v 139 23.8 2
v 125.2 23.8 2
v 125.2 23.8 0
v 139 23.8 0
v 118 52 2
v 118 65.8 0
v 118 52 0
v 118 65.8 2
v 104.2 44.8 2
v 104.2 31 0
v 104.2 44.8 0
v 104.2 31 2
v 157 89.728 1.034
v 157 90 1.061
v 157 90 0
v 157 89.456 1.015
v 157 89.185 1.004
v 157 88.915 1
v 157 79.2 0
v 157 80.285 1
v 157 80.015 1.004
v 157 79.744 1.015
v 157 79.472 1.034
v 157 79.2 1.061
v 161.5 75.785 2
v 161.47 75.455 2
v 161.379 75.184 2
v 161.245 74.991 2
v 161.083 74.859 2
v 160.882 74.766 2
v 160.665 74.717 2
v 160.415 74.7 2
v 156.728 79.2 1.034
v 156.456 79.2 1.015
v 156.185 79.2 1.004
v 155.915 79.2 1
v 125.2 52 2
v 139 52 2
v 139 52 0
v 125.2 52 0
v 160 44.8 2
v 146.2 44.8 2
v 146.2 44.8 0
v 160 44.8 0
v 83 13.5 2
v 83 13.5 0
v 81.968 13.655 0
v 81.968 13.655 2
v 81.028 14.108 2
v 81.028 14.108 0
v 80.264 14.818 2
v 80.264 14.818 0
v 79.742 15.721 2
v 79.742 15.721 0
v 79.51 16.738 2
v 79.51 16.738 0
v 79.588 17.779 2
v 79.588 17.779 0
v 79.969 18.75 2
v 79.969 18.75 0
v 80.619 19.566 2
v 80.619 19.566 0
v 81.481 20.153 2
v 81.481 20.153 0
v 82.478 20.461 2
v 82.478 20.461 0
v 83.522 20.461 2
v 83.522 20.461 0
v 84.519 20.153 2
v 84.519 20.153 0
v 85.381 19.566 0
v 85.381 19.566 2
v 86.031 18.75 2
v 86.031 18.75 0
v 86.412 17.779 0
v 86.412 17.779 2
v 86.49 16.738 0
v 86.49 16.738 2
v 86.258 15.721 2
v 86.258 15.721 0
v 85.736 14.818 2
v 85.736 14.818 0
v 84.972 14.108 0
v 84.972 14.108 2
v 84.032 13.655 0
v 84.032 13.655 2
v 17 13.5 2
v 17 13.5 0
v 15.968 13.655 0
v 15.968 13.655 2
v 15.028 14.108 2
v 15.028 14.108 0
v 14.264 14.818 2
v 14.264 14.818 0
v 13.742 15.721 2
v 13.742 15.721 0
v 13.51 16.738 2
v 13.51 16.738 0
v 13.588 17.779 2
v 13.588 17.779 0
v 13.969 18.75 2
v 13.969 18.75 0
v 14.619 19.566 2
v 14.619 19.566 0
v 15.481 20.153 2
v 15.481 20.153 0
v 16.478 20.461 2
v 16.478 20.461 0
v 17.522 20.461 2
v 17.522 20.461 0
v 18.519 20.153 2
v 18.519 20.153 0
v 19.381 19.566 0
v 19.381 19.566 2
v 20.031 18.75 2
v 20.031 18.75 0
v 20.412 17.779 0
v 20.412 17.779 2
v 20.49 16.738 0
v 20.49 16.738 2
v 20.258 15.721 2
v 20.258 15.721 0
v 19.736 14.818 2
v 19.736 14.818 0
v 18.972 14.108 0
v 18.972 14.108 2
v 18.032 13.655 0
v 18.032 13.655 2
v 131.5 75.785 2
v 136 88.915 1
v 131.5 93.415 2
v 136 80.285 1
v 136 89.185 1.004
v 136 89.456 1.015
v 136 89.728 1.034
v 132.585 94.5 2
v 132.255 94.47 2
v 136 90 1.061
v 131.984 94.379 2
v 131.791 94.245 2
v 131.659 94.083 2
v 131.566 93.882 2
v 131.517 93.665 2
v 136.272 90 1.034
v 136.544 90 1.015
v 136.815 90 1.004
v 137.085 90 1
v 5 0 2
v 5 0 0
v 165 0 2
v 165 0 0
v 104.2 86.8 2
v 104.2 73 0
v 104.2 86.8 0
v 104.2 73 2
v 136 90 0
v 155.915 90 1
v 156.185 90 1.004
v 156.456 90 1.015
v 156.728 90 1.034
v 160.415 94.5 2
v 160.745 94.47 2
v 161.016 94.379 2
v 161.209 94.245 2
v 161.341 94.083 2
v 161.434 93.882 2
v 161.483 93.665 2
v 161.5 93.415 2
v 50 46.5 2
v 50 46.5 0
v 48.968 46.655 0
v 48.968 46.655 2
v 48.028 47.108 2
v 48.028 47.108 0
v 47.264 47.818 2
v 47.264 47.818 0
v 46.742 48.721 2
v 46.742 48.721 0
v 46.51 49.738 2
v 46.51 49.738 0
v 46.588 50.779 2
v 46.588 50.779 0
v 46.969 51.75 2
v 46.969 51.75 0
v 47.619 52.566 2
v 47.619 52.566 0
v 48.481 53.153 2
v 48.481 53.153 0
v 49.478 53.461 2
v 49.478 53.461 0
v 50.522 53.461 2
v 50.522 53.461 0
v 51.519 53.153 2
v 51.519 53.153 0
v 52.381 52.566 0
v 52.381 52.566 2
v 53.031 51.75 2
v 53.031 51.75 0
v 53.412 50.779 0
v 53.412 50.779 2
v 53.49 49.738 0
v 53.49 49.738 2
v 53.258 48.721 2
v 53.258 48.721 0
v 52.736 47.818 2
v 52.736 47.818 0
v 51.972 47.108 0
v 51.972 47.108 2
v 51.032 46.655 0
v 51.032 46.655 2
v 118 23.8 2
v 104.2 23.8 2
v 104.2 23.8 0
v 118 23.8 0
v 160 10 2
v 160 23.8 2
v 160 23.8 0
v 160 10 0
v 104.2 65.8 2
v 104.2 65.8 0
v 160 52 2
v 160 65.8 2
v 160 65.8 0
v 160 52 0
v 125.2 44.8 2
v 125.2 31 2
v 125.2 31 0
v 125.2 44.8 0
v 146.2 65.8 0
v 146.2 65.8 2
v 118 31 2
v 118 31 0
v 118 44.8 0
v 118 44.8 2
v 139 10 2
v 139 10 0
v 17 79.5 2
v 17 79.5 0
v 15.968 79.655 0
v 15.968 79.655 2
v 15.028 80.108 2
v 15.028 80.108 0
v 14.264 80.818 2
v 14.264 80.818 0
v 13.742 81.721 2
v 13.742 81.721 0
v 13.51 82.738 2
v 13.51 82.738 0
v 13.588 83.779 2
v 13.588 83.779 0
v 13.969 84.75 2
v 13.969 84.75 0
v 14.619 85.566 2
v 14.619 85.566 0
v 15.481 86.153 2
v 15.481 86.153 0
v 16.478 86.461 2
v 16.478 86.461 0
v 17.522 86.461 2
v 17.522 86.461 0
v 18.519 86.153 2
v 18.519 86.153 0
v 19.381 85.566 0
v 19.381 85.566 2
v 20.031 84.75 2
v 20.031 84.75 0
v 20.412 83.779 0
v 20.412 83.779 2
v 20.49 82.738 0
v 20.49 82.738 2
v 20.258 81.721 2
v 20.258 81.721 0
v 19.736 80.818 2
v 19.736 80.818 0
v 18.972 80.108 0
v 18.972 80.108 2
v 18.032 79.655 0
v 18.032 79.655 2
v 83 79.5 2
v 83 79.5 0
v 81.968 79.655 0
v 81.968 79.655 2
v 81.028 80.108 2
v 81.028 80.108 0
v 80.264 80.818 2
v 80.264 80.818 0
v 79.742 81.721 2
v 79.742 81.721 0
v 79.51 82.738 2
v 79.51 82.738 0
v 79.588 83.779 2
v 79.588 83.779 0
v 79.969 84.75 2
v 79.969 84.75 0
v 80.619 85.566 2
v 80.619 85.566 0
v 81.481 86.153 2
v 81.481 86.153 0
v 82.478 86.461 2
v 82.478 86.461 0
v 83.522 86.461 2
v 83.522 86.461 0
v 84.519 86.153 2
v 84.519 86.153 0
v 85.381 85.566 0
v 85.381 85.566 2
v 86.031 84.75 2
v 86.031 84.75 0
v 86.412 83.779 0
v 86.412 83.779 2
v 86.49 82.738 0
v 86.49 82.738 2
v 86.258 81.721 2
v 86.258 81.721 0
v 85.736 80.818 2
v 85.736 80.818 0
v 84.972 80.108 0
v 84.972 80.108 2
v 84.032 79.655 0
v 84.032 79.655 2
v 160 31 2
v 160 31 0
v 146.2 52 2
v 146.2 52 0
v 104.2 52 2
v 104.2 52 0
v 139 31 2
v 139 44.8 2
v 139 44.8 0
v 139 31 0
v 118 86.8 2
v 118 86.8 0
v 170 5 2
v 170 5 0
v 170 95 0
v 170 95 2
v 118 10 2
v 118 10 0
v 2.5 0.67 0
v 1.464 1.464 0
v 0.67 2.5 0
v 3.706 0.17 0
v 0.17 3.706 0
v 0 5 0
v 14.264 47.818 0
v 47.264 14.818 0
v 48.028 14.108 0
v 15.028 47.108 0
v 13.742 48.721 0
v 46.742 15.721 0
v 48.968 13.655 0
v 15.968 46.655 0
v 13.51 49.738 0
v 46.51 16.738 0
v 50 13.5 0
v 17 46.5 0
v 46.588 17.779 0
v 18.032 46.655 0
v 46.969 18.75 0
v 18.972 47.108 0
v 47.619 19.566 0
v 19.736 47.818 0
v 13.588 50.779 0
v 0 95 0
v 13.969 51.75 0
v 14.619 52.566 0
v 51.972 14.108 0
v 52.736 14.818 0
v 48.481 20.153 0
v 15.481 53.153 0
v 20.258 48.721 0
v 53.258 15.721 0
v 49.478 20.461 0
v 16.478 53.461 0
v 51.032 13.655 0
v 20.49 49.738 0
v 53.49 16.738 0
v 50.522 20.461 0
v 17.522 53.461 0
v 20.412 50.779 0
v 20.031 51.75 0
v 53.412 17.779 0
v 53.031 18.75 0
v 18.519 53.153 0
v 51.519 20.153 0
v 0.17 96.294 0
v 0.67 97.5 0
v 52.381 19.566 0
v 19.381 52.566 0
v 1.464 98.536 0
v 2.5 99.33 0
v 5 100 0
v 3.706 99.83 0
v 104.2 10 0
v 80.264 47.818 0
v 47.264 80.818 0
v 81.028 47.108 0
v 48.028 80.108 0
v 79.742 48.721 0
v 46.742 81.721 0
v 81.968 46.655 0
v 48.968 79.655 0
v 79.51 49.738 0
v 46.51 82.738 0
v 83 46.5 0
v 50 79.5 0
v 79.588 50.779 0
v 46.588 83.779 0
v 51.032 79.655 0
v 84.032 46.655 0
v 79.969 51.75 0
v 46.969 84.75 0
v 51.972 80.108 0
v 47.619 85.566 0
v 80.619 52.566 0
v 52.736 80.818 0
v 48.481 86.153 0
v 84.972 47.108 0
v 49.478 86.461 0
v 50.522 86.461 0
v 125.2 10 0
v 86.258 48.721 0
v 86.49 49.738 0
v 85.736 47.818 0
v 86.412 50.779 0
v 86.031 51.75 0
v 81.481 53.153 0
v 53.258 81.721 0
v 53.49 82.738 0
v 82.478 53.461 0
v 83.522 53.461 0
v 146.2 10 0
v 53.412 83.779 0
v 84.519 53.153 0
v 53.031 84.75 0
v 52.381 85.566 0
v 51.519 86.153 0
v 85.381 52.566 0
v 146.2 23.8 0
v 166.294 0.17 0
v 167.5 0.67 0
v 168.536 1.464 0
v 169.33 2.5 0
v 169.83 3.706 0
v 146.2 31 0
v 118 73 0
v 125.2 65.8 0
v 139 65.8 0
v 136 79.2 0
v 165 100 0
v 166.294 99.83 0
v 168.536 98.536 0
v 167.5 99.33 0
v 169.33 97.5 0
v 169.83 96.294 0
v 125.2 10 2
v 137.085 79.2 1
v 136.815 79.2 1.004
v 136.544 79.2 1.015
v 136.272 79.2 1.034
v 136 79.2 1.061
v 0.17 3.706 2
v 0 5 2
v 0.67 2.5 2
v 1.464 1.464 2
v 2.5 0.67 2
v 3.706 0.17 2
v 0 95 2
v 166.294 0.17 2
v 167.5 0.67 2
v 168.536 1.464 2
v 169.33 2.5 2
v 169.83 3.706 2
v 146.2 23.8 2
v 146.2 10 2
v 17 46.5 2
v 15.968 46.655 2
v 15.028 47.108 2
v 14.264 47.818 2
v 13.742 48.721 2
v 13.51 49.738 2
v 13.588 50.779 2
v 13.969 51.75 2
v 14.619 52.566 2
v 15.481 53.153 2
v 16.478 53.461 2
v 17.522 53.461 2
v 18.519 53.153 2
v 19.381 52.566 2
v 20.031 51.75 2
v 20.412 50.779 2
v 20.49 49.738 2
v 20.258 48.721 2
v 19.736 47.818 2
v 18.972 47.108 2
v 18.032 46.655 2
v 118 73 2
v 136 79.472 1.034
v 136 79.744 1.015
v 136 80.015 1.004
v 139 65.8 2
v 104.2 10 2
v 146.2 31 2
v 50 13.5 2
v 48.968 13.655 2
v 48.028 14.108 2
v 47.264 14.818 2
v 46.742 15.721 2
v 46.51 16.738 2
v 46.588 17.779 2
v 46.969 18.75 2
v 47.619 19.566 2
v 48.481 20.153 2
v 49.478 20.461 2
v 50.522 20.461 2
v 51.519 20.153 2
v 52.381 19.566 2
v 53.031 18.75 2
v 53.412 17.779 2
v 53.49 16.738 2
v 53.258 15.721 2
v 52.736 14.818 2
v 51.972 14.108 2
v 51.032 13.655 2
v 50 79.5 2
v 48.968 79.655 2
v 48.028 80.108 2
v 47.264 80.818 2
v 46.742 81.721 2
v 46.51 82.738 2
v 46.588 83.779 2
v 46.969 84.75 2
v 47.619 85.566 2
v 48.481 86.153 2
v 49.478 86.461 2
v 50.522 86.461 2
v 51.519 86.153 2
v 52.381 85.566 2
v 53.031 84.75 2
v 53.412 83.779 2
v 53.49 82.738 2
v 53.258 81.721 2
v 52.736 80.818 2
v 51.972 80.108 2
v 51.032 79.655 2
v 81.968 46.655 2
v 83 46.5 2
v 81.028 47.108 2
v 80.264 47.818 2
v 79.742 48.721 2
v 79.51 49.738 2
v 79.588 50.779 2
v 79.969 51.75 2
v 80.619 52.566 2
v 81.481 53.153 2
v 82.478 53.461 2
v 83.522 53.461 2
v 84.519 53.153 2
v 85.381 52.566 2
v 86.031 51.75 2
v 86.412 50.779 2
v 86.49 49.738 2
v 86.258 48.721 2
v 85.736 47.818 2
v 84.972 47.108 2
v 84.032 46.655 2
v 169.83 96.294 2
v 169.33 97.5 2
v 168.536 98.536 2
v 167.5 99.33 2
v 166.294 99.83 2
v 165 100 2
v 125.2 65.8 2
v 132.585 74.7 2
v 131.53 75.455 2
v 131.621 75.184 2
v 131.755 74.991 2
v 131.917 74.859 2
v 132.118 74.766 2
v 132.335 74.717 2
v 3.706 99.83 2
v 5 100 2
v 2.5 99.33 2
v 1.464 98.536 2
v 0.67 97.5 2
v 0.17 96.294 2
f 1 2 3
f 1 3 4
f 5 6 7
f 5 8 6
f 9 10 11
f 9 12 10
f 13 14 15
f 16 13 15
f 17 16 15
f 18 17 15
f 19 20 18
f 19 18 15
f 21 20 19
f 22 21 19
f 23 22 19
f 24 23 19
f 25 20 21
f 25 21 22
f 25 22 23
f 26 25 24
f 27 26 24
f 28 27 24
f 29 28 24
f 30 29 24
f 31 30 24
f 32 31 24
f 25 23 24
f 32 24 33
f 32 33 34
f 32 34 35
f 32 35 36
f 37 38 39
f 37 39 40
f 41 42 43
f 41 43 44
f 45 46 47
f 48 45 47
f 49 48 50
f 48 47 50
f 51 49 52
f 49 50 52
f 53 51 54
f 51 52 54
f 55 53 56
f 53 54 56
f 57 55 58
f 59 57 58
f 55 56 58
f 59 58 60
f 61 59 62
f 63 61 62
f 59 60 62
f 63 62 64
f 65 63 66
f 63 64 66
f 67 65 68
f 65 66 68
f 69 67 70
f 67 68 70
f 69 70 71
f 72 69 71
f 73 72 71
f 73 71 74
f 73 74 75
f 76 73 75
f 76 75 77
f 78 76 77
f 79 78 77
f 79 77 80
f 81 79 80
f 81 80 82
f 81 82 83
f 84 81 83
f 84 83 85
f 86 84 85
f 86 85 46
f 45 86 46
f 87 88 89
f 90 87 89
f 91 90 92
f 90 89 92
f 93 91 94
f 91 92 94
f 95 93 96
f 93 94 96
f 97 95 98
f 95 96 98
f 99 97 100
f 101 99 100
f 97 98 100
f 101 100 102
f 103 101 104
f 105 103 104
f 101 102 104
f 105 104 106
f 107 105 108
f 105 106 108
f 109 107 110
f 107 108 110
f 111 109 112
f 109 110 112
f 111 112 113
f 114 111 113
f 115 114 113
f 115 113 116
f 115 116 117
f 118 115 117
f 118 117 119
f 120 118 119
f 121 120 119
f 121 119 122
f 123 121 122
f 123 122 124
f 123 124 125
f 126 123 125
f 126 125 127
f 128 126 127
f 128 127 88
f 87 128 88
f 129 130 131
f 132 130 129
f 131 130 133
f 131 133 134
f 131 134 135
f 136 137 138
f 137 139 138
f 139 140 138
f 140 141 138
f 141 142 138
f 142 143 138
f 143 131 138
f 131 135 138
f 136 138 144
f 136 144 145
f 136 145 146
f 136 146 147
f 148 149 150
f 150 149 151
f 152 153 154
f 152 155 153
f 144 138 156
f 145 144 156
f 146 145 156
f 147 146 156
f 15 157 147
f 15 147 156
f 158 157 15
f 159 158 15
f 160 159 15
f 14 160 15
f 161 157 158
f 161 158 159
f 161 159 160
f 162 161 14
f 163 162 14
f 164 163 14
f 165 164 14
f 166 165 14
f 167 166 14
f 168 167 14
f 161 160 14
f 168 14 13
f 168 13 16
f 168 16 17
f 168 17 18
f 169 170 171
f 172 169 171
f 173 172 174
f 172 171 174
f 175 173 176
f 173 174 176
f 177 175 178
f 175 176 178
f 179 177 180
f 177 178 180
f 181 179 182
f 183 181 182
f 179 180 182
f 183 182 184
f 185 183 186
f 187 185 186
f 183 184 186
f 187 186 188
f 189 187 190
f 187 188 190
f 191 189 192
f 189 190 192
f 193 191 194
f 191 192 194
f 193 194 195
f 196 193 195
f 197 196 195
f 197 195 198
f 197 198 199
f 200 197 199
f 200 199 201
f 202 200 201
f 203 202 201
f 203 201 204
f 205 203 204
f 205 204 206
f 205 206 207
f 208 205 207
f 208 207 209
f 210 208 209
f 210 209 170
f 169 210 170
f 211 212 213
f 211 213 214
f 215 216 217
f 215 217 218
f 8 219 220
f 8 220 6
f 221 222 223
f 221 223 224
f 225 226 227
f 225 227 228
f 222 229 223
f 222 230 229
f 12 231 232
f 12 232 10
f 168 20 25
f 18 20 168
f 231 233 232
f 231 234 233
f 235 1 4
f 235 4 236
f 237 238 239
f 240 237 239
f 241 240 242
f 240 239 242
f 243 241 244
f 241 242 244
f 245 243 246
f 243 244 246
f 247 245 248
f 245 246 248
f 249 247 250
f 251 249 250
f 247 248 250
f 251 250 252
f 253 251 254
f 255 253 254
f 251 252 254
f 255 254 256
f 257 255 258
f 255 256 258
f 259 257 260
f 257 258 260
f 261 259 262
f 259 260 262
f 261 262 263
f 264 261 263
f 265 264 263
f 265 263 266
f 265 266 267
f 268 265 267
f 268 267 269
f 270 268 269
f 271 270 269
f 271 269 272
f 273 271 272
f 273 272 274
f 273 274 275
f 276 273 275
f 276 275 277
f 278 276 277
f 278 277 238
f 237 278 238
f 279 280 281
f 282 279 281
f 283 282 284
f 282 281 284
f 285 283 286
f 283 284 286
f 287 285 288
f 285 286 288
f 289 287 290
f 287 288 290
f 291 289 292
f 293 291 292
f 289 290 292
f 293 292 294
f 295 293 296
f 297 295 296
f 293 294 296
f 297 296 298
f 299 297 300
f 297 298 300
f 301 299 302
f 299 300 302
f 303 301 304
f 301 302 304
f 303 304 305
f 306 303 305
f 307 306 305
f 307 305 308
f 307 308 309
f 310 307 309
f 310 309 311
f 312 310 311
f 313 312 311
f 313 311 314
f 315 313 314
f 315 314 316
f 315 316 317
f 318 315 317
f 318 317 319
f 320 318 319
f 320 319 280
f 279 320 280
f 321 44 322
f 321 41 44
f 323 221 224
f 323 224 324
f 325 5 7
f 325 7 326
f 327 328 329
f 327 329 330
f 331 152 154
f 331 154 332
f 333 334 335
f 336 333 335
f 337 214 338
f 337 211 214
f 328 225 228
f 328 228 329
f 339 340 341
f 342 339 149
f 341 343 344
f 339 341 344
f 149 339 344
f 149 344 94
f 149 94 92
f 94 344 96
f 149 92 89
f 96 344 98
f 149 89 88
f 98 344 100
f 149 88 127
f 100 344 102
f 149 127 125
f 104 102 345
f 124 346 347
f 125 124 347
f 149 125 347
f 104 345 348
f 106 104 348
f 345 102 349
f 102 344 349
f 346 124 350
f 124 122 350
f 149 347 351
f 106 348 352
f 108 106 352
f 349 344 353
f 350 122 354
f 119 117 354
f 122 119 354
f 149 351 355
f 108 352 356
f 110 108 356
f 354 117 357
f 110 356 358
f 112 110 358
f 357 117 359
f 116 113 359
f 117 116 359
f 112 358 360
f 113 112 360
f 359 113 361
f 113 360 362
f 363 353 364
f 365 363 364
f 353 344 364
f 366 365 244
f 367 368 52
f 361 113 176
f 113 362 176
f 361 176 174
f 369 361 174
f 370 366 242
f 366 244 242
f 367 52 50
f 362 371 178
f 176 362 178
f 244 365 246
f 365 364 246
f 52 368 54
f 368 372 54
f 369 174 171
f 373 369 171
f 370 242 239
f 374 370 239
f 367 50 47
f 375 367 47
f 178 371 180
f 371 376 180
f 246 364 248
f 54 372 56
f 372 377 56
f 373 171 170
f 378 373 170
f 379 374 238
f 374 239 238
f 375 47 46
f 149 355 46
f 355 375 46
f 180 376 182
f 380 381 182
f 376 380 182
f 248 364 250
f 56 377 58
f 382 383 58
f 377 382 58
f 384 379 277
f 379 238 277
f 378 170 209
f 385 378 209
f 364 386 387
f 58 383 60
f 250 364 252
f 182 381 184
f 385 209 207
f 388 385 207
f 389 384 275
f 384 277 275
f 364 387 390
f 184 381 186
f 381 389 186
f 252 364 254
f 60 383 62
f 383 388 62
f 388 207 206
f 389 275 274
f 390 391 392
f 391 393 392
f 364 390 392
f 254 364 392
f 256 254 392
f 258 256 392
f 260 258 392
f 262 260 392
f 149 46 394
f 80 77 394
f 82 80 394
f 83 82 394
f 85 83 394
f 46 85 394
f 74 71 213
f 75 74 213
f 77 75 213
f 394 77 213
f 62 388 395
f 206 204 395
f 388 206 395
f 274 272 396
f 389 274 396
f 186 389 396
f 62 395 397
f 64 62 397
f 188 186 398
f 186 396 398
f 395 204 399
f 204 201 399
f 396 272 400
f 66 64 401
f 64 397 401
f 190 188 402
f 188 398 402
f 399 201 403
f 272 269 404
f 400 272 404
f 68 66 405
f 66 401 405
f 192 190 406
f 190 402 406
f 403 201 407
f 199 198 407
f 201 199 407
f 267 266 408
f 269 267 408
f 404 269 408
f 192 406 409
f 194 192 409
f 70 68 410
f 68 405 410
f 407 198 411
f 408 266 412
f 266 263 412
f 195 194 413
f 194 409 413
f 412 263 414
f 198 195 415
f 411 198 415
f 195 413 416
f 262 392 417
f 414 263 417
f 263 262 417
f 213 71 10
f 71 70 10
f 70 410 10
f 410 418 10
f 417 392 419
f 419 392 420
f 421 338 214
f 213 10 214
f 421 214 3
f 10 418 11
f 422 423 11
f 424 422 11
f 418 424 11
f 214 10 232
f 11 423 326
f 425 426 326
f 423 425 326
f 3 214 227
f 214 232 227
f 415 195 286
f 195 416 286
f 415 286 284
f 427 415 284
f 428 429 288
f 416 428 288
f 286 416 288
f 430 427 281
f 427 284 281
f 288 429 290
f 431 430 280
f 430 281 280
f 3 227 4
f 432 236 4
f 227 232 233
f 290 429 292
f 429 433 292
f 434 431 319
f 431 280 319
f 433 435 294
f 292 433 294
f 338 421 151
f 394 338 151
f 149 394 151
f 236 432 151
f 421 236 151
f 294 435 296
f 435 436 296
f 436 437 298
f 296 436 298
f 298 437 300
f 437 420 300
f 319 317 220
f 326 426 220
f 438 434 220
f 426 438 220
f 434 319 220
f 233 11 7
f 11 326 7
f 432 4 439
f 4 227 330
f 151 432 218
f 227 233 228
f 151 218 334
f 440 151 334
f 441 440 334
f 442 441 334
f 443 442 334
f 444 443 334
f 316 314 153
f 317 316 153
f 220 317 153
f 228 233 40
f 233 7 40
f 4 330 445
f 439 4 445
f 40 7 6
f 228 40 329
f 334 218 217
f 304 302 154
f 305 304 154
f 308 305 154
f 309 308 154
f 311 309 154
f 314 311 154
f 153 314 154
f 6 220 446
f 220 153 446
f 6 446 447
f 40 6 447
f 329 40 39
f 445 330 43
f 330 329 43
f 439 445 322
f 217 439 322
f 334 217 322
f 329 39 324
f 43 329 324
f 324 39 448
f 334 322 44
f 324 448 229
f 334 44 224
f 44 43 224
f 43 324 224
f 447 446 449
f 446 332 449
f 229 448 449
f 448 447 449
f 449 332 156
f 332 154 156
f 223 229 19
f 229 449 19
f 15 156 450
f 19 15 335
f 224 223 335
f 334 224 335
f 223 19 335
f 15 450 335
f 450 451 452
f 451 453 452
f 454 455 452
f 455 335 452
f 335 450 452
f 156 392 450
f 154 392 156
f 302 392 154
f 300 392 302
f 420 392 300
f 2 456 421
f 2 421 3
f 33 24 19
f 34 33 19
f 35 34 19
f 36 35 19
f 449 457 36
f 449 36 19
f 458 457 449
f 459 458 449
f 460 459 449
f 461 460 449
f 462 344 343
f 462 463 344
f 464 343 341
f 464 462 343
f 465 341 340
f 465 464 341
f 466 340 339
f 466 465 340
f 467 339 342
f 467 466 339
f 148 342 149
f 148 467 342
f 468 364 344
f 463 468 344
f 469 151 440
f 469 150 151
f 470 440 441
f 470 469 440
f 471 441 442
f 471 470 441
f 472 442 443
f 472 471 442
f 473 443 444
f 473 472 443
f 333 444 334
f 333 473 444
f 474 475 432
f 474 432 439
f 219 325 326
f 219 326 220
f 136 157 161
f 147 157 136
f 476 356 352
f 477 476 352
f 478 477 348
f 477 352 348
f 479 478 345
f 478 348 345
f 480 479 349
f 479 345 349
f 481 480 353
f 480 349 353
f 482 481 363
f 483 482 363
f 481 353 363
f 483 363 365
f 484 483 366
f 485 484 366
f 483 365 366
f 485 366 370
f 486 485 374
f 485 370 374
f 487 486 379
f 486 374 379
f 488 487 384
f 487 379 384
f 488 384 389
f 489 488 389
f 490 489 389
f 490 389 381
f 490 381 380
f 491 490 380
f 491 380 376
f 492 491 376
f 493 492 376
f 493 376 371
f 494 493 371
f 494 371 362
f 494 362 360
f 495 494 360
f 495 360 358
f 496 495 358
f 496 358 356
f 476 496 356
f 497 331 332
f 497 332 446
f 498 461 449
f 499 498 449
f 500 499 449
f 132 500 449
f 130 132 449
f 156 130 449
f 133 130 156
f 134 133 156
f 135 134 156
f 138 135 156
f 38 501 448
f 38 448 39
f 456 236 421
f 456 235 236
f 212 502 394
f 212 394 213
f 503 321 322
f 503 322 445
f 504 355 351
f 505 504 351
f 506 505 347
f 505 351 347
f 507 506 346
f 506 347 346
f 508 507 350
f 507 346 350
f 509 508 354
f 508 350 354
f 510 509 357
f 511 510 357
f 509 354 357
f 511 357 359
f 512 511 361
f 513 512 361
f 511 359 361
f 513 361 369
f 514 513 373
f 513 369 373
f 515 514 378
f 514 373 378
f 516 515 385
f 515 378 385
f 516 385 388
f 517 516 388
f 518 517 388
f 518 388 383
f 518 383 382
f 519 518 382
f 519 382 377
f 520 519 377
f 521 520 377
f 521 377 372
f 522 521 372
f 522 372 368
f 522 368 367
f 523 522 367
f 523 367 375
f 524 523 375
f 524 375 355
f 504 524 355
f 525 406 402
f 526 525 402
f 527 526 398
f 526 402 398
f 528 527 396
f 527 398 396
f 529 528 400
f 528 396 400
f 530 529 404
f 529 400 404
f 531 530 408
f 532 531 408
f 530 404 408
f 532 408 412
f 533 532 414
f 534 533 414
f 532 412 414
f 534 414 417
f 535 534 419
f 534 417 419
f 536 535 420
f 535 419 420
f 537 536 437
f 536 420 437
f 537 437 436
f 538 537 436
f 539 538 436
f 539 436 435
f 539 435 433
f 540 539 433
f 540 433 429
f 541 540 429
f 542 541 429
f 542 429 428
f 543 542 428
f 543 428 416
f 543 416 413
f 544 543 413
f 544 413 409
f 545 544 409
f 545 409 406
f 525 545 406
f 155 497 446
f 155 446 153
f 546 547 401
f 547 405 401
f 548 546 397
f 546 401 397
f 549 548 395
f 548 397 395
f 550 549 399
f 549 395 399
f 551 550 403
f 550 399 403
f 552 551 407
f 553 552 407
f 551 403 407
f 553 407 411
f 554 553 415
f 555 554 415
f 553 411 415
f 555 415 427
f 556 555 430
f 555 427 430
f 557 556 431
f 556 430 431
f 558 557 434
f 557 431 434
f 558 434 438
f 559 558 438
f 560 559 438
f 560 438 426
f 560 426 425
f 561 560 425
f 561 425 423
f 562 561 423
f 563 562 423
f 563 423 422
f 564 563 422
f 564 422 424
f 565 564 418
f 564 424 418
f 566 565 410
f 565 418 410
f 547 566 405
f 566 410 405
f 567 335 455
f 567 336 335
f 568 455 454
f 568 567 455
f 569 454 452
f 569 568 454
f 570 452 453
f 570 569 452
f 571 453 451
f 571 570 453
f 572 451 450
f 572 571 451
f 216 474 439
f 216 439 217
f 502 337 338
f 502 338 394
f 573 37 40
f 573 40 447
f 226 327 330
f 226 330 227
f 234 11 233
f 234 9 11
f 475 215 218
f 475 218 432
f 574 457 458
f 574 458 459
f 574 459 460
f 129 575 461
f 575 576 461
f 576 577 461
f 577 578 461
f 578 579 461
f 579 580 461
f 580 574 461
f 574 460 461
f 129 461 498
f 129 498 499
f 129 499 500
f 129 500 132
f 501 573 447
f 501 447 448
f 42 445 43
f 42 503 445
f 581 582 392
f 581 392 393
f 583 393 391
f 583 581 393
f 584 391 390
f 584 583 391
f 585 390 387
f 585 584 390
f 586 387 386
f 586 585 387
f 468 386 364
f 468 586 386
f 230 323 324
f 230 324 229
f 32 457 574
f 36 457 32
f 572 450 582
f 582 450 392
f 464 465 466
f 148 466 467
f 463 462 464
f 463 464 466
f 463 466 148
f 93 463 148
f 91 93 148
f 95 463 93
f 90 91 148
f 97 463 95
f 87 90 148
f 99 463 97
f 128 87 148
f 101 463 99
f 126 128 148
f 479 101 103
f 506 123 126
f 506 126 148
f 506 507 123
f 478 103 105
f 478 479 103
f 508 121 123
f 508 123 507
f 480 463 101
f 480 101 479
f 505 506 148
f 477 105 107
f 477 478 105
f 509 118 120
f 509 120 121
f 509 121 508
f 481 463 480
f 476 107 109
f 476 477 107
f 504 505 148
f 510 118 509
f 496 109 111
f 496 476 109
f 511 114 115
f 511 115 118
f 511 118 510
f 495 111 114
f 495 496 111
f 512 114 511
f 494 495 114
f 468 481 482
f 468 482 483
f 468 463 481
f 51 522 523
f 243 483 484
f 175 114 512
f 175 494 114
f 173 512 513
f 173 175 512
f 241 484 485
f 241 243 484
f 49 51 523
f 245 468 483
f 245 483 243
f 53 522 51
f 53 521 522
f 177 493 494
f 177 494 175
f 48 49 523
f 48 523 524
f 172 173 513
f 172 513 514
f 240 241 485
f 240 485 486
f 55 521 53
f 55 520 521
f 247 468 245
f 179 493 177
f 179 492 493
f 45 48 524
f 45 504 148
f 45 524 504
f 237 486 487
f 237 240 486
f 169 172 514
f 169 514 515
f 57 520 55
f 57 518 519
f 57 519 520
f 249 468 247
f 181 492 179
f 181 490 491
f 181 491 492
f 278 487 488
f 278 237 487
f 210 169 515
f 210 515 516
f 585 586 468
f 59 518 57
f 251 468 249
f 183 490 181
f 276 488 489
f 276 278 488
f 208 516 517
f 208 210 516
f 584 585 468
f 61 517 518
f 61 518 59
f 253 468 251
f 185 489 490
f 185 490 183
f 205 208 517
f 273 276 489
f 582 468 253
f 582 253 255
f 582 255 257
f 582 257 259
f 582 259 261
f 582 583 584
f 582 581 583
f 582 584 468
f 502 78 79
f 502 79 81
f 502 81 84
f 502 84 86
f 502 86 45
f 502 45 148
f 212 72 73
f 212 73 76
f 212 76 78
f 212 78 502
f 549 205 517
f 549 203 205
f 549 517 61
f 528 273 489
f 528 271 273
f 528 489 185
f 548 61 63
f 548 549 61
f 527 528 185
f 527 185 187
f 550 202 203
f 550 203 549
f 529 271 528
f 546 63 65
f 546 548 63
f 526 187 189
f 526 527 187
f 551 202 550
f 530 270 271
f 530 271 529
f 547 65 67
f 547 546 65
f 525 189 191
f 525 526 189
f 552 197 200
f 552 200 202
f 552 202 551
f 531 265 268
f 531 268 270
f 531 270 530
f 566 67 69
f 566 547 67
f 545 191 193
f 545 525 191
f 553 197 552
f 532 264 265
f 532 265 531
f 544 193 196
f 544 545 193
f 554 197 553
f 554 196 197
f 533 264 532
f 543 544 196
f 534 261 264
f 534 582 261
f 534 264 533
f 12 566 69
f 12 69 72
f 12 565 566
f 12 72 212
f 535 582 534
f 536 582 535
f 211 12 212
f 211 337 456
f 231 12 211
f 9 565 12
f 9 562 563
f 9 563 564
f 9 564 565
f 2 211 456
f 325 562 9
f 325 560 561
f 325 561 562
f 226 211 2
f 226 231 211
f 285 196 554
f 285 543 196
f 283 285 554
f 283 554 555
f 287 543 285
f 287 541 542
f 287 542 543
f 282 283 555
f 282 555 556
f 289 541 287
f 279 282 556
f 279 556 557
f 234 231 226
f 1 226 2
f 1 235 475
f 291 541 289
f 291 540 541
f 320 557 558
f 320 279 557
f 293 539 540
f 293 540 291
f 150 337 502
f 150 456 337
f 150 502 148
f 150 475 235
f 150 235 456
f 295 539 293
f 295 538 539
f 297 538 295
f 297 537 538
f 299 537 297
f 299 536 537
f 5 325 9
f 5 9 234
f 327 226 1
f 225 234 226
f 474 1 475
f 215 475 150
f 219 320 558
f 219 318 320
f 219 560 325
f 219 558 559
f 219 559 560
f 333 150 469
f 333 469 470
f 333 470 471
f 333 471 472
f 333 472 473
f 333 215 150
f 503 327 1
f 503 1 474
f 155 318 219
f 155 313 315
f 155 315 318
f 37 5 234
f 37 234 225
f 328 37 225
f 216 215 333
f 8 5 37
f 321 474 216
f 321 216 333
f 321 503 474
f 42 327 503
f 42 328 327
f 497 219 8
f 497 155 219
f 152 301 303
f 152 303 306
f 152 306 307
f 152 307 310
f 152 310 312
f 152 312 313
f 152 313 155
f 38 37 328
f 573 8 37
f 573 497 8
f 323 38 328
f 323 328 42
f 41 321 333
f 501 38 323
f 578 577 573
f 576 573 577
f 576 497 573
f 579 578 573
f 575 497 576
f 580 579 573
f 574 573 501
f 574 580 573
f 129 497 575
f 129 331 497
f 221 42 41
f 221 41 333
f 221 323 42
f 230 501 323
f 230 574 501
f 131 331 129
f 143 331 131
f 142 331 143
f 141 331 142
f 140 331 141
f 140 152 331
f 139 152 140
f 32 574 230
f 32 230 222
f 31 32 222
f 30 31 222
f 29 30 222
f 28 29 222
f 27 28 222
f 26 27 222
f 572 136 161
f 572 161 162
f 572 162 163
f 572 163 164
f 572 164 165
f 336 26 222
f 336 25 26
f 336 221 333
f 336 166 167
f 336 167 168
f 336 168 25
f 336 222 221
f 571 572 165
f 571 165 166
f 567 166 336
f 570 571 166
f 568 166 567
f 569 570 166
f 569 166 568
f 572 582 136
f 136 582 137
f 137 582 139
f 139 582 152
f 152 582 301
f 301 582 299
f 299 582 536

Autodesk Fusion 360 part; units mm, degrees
sketch "Sketch1" plane through (0, 0, 0) normal (0, 0, 1) x (1, 0, 0)
  line L0 (0, 0) -> (170, 0)
  line L1 (170, 0) -> (170, 100)
  line L2 (170, 100) -> (0, 100)
  line L3 (0, 100) -> (0, 0)
  dimension "d1" = 170
  dimension "d2" = 100
extrude "Extrude1" add sketch "Sketch1" along normal blind 2 makes body 1
sketch "Sketch2" plane through (0, 0, 2) normal (0, 0, 1) x (-1, 0, 0)
  line L0 (0, -100) -> (0, 0)
  line L1 (0, 0) -> (-170, 0)
  line L2 (-170, 0) -> (-170, -100)
  line L3 (-170, -100) -> (0, -100)
  circle A0 centre (-17, -83) radius 3.5
  circle A1 centre (-50, -83) radius 3.5
  circle A2 centre (-83, -83) radius 3.5
  circle A3 centre (-17, -50) radius 3.5
  circle A4 centre (-50, -50) radius 3.5
  circle A5 centre (-83, -50) radius 3.5
  circle A6 centre (-17, -17) radius 3.5
  circle A7 centre (-50, -17) radius 3.5
  circle A8 centre (-83, -17) radius 3.5
  line L4 (-146.2, -23.8) -> (-160, -23.8)
  line L5 (-160, -23.8) -> (-160, -10)
  line L6 (-160, -10) -> (-146.2, -10)
  line L7 (-146.2, -10) -> (-146.2, -23.8)
  dimension "d5" = 7
  dimension "d9" = -66
  dimension "d10" = 66
  dimension "d11" = 100
  dimension "d12" = 33
  dimension "d13" = 17
  dimension "d14" = 17
  dimension "d15" = 17
  dimension "d16" = 13.8
  dimension "d17" = 13.8
  dimension "d18" = 10
  dimension "d19" = 10
sketch "Sketch3" plane through (0, 0, 2) normal (0, 0, 1) x (-1, 0, 0)
hole "Hole1" at (17, 83, 2) at (50, 83, 2) at (83, 83, 2) at (83, 50, 2) at (83, 17, 2) at (50, 17, 2) at (17, 17, 2) at (17, 50, 2) at (50, 50, 2) direction (0, 0, -1) diameter 7 depth 2 tip angle 180 bodies 1
sketch "Sketch4" plane through (0, 0, 2) normal (0, 0, 1) x (-1, 0, 0)
  line L0 (0, -100) -> (0, 0)
  line L1 (0, 0) -> (-170, 0)
  line L2 (-170, 0) -> (-170, -100)
  line L3 (-170, -100) -> (0, -100)
  circle A0 centre (-50, -50) radius 3.5
  circle A1 centre (-17, -17) radius 3.5
  circle A2 centre (-83, -17) radius 3.5
  circle A3 centre (-83, -83) radius 3.5
  circle A4 centre (-17, -83) radius 3.5
  circle A5 centre (-50, -83) radius 3.5
  circle A6 centre (-83, -50) radius 3.5
  circle A7 centre (-50, -17) radius 3.5
  circle A8 centre (-17, -50) radius 3.5
  line L4 (-160, -10) -> (-146.2, -10)
  line L5 (-146.2, -10) -> (-146.2, -23.8)
  line L6 (-146.2, -23.8) -> (-160, -23.8)
  line L7 (-160, -23.8) -> (-160, -10)
  dimension "d23" = 13.8
  dimension "d24" = 13.8
  dimension "d25" = 10
  dimension "d26" = 10
sketch "Sketch5" plane through (0, 0, 2) normal (0, 0, 1) x (-1, 0, 0)
extrude "Extrude2" cut sketch "Sketch4" against normal blind 2 contours L4 L5 L6 L7 bodies 1
pattern_linear "R-Pattern1" count 3 spacing 21 along (-1, 0, 0) count 3 spacing 21 along (0, 1, 0) of "Extrude2"
sketch "Sketch6" plane through (0, 0, 2) normal (0, 0, 1) x (-1, 0, 0)
  line L0 (-146.2, -10) -> (-146.2, -23.8)
  line L1 (-146.2, -23.8) -> (-160, -23.8)
  line L2 (-160, -23.8) -> (-160, -10)
  line L3 (-160, -10) -> (-146.2, -10)
  line L4 (0, -100) -> (0, 0)
  line L5 (0, 0) -> (-170, 0)
  line L6 (-170, 0) -> (-170, -100)
  line L7 (-170, -100) -> (0, -100)
  circle A0 centre (-50, -50) radius 3.5
  circle A1 centre (-17, -17) radius 3.5
  circle A2 centre (-83, -17) radius 3.5
  circle A3 centre (-83, -83) radius 3.5
  circle A4 centre (-17, -83) radius 3.5
  circle A5 centre (-50, -83) radius 3.5
  circle A6 centre (-83, -50) radius 3.5
  circle A7 centre (-50, -17) radius 3.5
  circle A8 centre (-17, -50) radius 3.5
  line L8 (-125.2, -10) -> (-125.2, -23.8)
  line L9 (-125.2, -23.8) -> (-139, -23.8)
  line L10 (-139, -23.8) -> (-139, -10)
  line L11 (-139, -10) -> (-125.2, -10)
  line L12 (-104.2, -10) -> (-104.2, -23.8)
  line L13 (-104.2, -23.8) -> (-118, -23.8)
  line L14 (-118, -23.8) -> (-118, -10)
  line L15 (-118, -10) -> (-104.2, -10)
  line L16 (-146.2, -31) -> (-146.2, -44.8)
  line L17 (-146.2, -44.8) -> (-160, -44.8)
  line L18 (-160, -44.8) -> (-160, -31)
  line L19 (-160, -31) -> (-146.2, -31)
  line L20 (-125.2, -31) -> (-125.2, -44.8)
  line L21 (-125.2, -44.8) -> (-139, -44.8)
  line L22 (-139, -44.8) -> (-139, -31)
  line L23 (-139, -31) -> (-125.2, -31)
  line L24 (-104.2, -31) -> (-104.2, -44.8)
  line L25 (-104.2, -44.8) -> (-118, -44.8)
  line L26 (-118, -44.8) -> (-118, -31)
  line L27 (-118, -31) -> (-104.2, -31)
  line L28 (-146.2, -52) -> (-146.2, -65.8)
  line L29 (-146.2, -65.8) -> (-160, -65.8)
  line L30 (-160, -65.8) -> (-160, -52)
  line L31 (-160, -52) -> (-146.2, -52)
  line L32 (-125.2, -52) -> (-125.2, -65.8)
  line L33 (-125.2, -65.8) -> (-139, -65.8)
  line L34 (-139, -65.8) -> (-139, -52)
  line L35 (-139, -52) -> (-125.2, -52)
  line L36 (-104.2, -52) -> (-104.2, -65.8)
  line L37 (-104.2, -65.8) -> (-118, -65.8)
  line L38 (-118, -65.8) -> (-118, -52)
  line L39 (-118, -52) -> (-104.2, -52)
  circle A9 centre (-83, -17) radius 10.5
  dimension "d33" = 21
sketch "Sketch7" plane through (0, 0, 2) normal (0, 0, 1) x (-1, 0, 0)
  line L0 (-133, -96.2) -> (-160, -96.2)
  line L1 (-160, -96.2) -> (-160, -69.2)
  line L2 (-160, -69.2) -> (-133, -69.2)
  line L3 (-133, -69.2) -> (-133, -96.2)
  line L4 (-170, -100) -> (0, -100)
  line L5 (-160, -10) -> (-146.2, -10)
  line L6 (0, 0) -> (-170, 0)
  line L7 (-136, -90) -> (-157, -90)
  line L8 (-157, -90) -> (-157, -79.2)
  line L9 (-157, -79.2) -> (-136, -79.2)
  line L10 (-136, -79.2) -> (-136, -90)
  line L11 (-170, 0) -> (-170, -100)
  line L12 (-146.2, -65.8) -> (-160, -65.8)
  dimension "d36" = 27
  dimension "d37" = 27
  dimension "d38" = 3.8
  dimension "d39" = 10
  dimension "d40" = 3
  dimension "d42" = 10.8
  dimension "d43" = 21
  dimension "d53" = 10
  dimension "d55" = 10
  dimension "d67" = 6.2
  dimension "d68" = 10
  dimension "d69" = 3.4
extrude "Extrude3" cut sketch "Sketch7" against normal blind 2 contours L7 L8 L9 L10 bodies 1
chamfer "Chamfer1" distance 4.5 distance2 1 4 edges at (146.5, 90, 2) (136, 84.6, 2) (146.5, 79.2, 2) (157, 84.6, 2) measured on face at (108.8707, 79.8596, 2) measured on face at (108.8707, 79.8596, 2) measured on face at (108.8707, 79.8596, 2) measured on face at (108.8707, 79.8596, 2) on bodies 1
sketch "Sketch8" plane through (0, 0, 2) normal (0, 0, 1) x (-1, 0, 0)
  line L0 (-104.2, -86.8) -> (-118, -86.8)
  line L1 (-118, -86.8) -> (-118, -73)
  line L2 (-118, -73) -> (-104.2, -73)
  line L3 (-104.2, -73) -> (-104.2, -86.8)
  line L4 (-118, -52) -> (-104.2, -52)
  line L5 (-125.2, -52) -> (-125.2, -65.8)
  point P0 (-104.2, -10)
  point P1 (-125.2, -10)
  dimension "d48" = 21
  dimension "d49" = 21
  dimension "d50" = 21
  dimension "d51" = 13.8
  dimension "d52" = 13.8
extrude "Extrude4" cut sketch "Sketch8" against normal blind 2 bodies 1
sketch "Sketch9" plane through (0, 0, 2) normal (0, 0, 1) x (-1, 0, 0)
  line L0 (-125.2, -65.8) -> (-139, -65.8)
  line L1 (-118, -73) -> (-104.2, -73)
  line L2 (-104.2, -65.8) -> (-118, -65.8)
  dimension "d61" = 7.2
fillet "Fillet1" radius 5 4 edges at (170, 0, 1) (170, 100, 1) (0, 0, 1) (0, 100, 1) on bodies 1
fillet "Fillet2" radius 5 4 edges at (133.75, 92.25, 1.5) (133.75, 76.95, 1.5) (159.25, 92.25, 1.5) (159.25, 76.95, 1.5) on bodies 1
sketch "Sketch10" plane through (0, 0, 2) normal (0, 0, 1) x (-1, 0, 0)
  line L0 (-5, 0) -> (-165, 0)
  line L1 (-170, -5) -> (-170, -95)
  line L2 (-165, -100) -> (-5, -100)
  line L3 (0, -95) -> (0, -5)
  line L4 (-3, -102) -> (-167, -102)
  line L5 (-172, -97) -> (-172, -3)
  line L6 (-167, 2) -> (-3, 2)
  line L7 (2, -3) -> (2, -97)
  arc A0 (-5, -100) -> (0, -95) centre (-5, -95) ccw
  arc A1 (-170, -95) -> (-165, -100) centre (-165, -95) ccw
  arc A2 (-165, 0) -> (-170, -5) centre (-165, -5) ccw
  arc A3 (0, -5) -> (-5, 0) centre (-5, -5) ccw
  arc A4 (2, -3) -> (-3, 2) centre (-3, -3) ccw
  arc A5 (-3, -102) -> (2, -97) centre (-3, -97) ccw
  arc A6 (-172, -97) -> (-167, -102) centre (-167, -97) ccw
  arc A7 (-167, 2) -> (-172, -3) centre (-167, -3) ccw
  dimension "d70" = 2
  dimension "d71" = 2
  dimension "d72" = 2
  dimension "d73" = 2
  dimension "d74" = 5
extrude "Extrude5" add sketch "Sketch10" along normal blind 50 separate body makes body 2
move_face "OffsetFaces1" offset 2 1 faces at (58.3333, -1.3333, 2) on bodies 2
sketch "Sketch11" plane through (0, 100, 0) normal (0, -1, 0) x (1, 0, 0)
  line L0 (5, 0) -> (165, 0)
  line L1 (165, 0) -> (165, 52)
  line L2 (165, 52) -> (5, 52)
  line L3 (5, 52) -> (5, 0)
  line L4 (165, 0.1269) -> (161.7551, 0.1269)
  line L5 (161.7551, 0.1269) -> (161.7551, 2.1269)
  line L6 (161.7551, 2.1269) -> (165, 2.1269)
  line L7 (165, 2.1269) -> (165, 0.1269)
  line L8 (161.7551, 2.1269) -> (156.7551, 2.1269)
  line L9 (156.7551, 2.1269) -> (156.7551, 4.1269)
  line L10 (156.7551, 4.1269) -> (161.7551, 4.1269)
  line L11 (161.7551, 4.1269) -> (161.7551, 2.1269)
  dimension "d78" = 2
  dimension "d79" = 5
  dimension "d80" = 2
  dimension "d81" = 160
hidden bodies 2
